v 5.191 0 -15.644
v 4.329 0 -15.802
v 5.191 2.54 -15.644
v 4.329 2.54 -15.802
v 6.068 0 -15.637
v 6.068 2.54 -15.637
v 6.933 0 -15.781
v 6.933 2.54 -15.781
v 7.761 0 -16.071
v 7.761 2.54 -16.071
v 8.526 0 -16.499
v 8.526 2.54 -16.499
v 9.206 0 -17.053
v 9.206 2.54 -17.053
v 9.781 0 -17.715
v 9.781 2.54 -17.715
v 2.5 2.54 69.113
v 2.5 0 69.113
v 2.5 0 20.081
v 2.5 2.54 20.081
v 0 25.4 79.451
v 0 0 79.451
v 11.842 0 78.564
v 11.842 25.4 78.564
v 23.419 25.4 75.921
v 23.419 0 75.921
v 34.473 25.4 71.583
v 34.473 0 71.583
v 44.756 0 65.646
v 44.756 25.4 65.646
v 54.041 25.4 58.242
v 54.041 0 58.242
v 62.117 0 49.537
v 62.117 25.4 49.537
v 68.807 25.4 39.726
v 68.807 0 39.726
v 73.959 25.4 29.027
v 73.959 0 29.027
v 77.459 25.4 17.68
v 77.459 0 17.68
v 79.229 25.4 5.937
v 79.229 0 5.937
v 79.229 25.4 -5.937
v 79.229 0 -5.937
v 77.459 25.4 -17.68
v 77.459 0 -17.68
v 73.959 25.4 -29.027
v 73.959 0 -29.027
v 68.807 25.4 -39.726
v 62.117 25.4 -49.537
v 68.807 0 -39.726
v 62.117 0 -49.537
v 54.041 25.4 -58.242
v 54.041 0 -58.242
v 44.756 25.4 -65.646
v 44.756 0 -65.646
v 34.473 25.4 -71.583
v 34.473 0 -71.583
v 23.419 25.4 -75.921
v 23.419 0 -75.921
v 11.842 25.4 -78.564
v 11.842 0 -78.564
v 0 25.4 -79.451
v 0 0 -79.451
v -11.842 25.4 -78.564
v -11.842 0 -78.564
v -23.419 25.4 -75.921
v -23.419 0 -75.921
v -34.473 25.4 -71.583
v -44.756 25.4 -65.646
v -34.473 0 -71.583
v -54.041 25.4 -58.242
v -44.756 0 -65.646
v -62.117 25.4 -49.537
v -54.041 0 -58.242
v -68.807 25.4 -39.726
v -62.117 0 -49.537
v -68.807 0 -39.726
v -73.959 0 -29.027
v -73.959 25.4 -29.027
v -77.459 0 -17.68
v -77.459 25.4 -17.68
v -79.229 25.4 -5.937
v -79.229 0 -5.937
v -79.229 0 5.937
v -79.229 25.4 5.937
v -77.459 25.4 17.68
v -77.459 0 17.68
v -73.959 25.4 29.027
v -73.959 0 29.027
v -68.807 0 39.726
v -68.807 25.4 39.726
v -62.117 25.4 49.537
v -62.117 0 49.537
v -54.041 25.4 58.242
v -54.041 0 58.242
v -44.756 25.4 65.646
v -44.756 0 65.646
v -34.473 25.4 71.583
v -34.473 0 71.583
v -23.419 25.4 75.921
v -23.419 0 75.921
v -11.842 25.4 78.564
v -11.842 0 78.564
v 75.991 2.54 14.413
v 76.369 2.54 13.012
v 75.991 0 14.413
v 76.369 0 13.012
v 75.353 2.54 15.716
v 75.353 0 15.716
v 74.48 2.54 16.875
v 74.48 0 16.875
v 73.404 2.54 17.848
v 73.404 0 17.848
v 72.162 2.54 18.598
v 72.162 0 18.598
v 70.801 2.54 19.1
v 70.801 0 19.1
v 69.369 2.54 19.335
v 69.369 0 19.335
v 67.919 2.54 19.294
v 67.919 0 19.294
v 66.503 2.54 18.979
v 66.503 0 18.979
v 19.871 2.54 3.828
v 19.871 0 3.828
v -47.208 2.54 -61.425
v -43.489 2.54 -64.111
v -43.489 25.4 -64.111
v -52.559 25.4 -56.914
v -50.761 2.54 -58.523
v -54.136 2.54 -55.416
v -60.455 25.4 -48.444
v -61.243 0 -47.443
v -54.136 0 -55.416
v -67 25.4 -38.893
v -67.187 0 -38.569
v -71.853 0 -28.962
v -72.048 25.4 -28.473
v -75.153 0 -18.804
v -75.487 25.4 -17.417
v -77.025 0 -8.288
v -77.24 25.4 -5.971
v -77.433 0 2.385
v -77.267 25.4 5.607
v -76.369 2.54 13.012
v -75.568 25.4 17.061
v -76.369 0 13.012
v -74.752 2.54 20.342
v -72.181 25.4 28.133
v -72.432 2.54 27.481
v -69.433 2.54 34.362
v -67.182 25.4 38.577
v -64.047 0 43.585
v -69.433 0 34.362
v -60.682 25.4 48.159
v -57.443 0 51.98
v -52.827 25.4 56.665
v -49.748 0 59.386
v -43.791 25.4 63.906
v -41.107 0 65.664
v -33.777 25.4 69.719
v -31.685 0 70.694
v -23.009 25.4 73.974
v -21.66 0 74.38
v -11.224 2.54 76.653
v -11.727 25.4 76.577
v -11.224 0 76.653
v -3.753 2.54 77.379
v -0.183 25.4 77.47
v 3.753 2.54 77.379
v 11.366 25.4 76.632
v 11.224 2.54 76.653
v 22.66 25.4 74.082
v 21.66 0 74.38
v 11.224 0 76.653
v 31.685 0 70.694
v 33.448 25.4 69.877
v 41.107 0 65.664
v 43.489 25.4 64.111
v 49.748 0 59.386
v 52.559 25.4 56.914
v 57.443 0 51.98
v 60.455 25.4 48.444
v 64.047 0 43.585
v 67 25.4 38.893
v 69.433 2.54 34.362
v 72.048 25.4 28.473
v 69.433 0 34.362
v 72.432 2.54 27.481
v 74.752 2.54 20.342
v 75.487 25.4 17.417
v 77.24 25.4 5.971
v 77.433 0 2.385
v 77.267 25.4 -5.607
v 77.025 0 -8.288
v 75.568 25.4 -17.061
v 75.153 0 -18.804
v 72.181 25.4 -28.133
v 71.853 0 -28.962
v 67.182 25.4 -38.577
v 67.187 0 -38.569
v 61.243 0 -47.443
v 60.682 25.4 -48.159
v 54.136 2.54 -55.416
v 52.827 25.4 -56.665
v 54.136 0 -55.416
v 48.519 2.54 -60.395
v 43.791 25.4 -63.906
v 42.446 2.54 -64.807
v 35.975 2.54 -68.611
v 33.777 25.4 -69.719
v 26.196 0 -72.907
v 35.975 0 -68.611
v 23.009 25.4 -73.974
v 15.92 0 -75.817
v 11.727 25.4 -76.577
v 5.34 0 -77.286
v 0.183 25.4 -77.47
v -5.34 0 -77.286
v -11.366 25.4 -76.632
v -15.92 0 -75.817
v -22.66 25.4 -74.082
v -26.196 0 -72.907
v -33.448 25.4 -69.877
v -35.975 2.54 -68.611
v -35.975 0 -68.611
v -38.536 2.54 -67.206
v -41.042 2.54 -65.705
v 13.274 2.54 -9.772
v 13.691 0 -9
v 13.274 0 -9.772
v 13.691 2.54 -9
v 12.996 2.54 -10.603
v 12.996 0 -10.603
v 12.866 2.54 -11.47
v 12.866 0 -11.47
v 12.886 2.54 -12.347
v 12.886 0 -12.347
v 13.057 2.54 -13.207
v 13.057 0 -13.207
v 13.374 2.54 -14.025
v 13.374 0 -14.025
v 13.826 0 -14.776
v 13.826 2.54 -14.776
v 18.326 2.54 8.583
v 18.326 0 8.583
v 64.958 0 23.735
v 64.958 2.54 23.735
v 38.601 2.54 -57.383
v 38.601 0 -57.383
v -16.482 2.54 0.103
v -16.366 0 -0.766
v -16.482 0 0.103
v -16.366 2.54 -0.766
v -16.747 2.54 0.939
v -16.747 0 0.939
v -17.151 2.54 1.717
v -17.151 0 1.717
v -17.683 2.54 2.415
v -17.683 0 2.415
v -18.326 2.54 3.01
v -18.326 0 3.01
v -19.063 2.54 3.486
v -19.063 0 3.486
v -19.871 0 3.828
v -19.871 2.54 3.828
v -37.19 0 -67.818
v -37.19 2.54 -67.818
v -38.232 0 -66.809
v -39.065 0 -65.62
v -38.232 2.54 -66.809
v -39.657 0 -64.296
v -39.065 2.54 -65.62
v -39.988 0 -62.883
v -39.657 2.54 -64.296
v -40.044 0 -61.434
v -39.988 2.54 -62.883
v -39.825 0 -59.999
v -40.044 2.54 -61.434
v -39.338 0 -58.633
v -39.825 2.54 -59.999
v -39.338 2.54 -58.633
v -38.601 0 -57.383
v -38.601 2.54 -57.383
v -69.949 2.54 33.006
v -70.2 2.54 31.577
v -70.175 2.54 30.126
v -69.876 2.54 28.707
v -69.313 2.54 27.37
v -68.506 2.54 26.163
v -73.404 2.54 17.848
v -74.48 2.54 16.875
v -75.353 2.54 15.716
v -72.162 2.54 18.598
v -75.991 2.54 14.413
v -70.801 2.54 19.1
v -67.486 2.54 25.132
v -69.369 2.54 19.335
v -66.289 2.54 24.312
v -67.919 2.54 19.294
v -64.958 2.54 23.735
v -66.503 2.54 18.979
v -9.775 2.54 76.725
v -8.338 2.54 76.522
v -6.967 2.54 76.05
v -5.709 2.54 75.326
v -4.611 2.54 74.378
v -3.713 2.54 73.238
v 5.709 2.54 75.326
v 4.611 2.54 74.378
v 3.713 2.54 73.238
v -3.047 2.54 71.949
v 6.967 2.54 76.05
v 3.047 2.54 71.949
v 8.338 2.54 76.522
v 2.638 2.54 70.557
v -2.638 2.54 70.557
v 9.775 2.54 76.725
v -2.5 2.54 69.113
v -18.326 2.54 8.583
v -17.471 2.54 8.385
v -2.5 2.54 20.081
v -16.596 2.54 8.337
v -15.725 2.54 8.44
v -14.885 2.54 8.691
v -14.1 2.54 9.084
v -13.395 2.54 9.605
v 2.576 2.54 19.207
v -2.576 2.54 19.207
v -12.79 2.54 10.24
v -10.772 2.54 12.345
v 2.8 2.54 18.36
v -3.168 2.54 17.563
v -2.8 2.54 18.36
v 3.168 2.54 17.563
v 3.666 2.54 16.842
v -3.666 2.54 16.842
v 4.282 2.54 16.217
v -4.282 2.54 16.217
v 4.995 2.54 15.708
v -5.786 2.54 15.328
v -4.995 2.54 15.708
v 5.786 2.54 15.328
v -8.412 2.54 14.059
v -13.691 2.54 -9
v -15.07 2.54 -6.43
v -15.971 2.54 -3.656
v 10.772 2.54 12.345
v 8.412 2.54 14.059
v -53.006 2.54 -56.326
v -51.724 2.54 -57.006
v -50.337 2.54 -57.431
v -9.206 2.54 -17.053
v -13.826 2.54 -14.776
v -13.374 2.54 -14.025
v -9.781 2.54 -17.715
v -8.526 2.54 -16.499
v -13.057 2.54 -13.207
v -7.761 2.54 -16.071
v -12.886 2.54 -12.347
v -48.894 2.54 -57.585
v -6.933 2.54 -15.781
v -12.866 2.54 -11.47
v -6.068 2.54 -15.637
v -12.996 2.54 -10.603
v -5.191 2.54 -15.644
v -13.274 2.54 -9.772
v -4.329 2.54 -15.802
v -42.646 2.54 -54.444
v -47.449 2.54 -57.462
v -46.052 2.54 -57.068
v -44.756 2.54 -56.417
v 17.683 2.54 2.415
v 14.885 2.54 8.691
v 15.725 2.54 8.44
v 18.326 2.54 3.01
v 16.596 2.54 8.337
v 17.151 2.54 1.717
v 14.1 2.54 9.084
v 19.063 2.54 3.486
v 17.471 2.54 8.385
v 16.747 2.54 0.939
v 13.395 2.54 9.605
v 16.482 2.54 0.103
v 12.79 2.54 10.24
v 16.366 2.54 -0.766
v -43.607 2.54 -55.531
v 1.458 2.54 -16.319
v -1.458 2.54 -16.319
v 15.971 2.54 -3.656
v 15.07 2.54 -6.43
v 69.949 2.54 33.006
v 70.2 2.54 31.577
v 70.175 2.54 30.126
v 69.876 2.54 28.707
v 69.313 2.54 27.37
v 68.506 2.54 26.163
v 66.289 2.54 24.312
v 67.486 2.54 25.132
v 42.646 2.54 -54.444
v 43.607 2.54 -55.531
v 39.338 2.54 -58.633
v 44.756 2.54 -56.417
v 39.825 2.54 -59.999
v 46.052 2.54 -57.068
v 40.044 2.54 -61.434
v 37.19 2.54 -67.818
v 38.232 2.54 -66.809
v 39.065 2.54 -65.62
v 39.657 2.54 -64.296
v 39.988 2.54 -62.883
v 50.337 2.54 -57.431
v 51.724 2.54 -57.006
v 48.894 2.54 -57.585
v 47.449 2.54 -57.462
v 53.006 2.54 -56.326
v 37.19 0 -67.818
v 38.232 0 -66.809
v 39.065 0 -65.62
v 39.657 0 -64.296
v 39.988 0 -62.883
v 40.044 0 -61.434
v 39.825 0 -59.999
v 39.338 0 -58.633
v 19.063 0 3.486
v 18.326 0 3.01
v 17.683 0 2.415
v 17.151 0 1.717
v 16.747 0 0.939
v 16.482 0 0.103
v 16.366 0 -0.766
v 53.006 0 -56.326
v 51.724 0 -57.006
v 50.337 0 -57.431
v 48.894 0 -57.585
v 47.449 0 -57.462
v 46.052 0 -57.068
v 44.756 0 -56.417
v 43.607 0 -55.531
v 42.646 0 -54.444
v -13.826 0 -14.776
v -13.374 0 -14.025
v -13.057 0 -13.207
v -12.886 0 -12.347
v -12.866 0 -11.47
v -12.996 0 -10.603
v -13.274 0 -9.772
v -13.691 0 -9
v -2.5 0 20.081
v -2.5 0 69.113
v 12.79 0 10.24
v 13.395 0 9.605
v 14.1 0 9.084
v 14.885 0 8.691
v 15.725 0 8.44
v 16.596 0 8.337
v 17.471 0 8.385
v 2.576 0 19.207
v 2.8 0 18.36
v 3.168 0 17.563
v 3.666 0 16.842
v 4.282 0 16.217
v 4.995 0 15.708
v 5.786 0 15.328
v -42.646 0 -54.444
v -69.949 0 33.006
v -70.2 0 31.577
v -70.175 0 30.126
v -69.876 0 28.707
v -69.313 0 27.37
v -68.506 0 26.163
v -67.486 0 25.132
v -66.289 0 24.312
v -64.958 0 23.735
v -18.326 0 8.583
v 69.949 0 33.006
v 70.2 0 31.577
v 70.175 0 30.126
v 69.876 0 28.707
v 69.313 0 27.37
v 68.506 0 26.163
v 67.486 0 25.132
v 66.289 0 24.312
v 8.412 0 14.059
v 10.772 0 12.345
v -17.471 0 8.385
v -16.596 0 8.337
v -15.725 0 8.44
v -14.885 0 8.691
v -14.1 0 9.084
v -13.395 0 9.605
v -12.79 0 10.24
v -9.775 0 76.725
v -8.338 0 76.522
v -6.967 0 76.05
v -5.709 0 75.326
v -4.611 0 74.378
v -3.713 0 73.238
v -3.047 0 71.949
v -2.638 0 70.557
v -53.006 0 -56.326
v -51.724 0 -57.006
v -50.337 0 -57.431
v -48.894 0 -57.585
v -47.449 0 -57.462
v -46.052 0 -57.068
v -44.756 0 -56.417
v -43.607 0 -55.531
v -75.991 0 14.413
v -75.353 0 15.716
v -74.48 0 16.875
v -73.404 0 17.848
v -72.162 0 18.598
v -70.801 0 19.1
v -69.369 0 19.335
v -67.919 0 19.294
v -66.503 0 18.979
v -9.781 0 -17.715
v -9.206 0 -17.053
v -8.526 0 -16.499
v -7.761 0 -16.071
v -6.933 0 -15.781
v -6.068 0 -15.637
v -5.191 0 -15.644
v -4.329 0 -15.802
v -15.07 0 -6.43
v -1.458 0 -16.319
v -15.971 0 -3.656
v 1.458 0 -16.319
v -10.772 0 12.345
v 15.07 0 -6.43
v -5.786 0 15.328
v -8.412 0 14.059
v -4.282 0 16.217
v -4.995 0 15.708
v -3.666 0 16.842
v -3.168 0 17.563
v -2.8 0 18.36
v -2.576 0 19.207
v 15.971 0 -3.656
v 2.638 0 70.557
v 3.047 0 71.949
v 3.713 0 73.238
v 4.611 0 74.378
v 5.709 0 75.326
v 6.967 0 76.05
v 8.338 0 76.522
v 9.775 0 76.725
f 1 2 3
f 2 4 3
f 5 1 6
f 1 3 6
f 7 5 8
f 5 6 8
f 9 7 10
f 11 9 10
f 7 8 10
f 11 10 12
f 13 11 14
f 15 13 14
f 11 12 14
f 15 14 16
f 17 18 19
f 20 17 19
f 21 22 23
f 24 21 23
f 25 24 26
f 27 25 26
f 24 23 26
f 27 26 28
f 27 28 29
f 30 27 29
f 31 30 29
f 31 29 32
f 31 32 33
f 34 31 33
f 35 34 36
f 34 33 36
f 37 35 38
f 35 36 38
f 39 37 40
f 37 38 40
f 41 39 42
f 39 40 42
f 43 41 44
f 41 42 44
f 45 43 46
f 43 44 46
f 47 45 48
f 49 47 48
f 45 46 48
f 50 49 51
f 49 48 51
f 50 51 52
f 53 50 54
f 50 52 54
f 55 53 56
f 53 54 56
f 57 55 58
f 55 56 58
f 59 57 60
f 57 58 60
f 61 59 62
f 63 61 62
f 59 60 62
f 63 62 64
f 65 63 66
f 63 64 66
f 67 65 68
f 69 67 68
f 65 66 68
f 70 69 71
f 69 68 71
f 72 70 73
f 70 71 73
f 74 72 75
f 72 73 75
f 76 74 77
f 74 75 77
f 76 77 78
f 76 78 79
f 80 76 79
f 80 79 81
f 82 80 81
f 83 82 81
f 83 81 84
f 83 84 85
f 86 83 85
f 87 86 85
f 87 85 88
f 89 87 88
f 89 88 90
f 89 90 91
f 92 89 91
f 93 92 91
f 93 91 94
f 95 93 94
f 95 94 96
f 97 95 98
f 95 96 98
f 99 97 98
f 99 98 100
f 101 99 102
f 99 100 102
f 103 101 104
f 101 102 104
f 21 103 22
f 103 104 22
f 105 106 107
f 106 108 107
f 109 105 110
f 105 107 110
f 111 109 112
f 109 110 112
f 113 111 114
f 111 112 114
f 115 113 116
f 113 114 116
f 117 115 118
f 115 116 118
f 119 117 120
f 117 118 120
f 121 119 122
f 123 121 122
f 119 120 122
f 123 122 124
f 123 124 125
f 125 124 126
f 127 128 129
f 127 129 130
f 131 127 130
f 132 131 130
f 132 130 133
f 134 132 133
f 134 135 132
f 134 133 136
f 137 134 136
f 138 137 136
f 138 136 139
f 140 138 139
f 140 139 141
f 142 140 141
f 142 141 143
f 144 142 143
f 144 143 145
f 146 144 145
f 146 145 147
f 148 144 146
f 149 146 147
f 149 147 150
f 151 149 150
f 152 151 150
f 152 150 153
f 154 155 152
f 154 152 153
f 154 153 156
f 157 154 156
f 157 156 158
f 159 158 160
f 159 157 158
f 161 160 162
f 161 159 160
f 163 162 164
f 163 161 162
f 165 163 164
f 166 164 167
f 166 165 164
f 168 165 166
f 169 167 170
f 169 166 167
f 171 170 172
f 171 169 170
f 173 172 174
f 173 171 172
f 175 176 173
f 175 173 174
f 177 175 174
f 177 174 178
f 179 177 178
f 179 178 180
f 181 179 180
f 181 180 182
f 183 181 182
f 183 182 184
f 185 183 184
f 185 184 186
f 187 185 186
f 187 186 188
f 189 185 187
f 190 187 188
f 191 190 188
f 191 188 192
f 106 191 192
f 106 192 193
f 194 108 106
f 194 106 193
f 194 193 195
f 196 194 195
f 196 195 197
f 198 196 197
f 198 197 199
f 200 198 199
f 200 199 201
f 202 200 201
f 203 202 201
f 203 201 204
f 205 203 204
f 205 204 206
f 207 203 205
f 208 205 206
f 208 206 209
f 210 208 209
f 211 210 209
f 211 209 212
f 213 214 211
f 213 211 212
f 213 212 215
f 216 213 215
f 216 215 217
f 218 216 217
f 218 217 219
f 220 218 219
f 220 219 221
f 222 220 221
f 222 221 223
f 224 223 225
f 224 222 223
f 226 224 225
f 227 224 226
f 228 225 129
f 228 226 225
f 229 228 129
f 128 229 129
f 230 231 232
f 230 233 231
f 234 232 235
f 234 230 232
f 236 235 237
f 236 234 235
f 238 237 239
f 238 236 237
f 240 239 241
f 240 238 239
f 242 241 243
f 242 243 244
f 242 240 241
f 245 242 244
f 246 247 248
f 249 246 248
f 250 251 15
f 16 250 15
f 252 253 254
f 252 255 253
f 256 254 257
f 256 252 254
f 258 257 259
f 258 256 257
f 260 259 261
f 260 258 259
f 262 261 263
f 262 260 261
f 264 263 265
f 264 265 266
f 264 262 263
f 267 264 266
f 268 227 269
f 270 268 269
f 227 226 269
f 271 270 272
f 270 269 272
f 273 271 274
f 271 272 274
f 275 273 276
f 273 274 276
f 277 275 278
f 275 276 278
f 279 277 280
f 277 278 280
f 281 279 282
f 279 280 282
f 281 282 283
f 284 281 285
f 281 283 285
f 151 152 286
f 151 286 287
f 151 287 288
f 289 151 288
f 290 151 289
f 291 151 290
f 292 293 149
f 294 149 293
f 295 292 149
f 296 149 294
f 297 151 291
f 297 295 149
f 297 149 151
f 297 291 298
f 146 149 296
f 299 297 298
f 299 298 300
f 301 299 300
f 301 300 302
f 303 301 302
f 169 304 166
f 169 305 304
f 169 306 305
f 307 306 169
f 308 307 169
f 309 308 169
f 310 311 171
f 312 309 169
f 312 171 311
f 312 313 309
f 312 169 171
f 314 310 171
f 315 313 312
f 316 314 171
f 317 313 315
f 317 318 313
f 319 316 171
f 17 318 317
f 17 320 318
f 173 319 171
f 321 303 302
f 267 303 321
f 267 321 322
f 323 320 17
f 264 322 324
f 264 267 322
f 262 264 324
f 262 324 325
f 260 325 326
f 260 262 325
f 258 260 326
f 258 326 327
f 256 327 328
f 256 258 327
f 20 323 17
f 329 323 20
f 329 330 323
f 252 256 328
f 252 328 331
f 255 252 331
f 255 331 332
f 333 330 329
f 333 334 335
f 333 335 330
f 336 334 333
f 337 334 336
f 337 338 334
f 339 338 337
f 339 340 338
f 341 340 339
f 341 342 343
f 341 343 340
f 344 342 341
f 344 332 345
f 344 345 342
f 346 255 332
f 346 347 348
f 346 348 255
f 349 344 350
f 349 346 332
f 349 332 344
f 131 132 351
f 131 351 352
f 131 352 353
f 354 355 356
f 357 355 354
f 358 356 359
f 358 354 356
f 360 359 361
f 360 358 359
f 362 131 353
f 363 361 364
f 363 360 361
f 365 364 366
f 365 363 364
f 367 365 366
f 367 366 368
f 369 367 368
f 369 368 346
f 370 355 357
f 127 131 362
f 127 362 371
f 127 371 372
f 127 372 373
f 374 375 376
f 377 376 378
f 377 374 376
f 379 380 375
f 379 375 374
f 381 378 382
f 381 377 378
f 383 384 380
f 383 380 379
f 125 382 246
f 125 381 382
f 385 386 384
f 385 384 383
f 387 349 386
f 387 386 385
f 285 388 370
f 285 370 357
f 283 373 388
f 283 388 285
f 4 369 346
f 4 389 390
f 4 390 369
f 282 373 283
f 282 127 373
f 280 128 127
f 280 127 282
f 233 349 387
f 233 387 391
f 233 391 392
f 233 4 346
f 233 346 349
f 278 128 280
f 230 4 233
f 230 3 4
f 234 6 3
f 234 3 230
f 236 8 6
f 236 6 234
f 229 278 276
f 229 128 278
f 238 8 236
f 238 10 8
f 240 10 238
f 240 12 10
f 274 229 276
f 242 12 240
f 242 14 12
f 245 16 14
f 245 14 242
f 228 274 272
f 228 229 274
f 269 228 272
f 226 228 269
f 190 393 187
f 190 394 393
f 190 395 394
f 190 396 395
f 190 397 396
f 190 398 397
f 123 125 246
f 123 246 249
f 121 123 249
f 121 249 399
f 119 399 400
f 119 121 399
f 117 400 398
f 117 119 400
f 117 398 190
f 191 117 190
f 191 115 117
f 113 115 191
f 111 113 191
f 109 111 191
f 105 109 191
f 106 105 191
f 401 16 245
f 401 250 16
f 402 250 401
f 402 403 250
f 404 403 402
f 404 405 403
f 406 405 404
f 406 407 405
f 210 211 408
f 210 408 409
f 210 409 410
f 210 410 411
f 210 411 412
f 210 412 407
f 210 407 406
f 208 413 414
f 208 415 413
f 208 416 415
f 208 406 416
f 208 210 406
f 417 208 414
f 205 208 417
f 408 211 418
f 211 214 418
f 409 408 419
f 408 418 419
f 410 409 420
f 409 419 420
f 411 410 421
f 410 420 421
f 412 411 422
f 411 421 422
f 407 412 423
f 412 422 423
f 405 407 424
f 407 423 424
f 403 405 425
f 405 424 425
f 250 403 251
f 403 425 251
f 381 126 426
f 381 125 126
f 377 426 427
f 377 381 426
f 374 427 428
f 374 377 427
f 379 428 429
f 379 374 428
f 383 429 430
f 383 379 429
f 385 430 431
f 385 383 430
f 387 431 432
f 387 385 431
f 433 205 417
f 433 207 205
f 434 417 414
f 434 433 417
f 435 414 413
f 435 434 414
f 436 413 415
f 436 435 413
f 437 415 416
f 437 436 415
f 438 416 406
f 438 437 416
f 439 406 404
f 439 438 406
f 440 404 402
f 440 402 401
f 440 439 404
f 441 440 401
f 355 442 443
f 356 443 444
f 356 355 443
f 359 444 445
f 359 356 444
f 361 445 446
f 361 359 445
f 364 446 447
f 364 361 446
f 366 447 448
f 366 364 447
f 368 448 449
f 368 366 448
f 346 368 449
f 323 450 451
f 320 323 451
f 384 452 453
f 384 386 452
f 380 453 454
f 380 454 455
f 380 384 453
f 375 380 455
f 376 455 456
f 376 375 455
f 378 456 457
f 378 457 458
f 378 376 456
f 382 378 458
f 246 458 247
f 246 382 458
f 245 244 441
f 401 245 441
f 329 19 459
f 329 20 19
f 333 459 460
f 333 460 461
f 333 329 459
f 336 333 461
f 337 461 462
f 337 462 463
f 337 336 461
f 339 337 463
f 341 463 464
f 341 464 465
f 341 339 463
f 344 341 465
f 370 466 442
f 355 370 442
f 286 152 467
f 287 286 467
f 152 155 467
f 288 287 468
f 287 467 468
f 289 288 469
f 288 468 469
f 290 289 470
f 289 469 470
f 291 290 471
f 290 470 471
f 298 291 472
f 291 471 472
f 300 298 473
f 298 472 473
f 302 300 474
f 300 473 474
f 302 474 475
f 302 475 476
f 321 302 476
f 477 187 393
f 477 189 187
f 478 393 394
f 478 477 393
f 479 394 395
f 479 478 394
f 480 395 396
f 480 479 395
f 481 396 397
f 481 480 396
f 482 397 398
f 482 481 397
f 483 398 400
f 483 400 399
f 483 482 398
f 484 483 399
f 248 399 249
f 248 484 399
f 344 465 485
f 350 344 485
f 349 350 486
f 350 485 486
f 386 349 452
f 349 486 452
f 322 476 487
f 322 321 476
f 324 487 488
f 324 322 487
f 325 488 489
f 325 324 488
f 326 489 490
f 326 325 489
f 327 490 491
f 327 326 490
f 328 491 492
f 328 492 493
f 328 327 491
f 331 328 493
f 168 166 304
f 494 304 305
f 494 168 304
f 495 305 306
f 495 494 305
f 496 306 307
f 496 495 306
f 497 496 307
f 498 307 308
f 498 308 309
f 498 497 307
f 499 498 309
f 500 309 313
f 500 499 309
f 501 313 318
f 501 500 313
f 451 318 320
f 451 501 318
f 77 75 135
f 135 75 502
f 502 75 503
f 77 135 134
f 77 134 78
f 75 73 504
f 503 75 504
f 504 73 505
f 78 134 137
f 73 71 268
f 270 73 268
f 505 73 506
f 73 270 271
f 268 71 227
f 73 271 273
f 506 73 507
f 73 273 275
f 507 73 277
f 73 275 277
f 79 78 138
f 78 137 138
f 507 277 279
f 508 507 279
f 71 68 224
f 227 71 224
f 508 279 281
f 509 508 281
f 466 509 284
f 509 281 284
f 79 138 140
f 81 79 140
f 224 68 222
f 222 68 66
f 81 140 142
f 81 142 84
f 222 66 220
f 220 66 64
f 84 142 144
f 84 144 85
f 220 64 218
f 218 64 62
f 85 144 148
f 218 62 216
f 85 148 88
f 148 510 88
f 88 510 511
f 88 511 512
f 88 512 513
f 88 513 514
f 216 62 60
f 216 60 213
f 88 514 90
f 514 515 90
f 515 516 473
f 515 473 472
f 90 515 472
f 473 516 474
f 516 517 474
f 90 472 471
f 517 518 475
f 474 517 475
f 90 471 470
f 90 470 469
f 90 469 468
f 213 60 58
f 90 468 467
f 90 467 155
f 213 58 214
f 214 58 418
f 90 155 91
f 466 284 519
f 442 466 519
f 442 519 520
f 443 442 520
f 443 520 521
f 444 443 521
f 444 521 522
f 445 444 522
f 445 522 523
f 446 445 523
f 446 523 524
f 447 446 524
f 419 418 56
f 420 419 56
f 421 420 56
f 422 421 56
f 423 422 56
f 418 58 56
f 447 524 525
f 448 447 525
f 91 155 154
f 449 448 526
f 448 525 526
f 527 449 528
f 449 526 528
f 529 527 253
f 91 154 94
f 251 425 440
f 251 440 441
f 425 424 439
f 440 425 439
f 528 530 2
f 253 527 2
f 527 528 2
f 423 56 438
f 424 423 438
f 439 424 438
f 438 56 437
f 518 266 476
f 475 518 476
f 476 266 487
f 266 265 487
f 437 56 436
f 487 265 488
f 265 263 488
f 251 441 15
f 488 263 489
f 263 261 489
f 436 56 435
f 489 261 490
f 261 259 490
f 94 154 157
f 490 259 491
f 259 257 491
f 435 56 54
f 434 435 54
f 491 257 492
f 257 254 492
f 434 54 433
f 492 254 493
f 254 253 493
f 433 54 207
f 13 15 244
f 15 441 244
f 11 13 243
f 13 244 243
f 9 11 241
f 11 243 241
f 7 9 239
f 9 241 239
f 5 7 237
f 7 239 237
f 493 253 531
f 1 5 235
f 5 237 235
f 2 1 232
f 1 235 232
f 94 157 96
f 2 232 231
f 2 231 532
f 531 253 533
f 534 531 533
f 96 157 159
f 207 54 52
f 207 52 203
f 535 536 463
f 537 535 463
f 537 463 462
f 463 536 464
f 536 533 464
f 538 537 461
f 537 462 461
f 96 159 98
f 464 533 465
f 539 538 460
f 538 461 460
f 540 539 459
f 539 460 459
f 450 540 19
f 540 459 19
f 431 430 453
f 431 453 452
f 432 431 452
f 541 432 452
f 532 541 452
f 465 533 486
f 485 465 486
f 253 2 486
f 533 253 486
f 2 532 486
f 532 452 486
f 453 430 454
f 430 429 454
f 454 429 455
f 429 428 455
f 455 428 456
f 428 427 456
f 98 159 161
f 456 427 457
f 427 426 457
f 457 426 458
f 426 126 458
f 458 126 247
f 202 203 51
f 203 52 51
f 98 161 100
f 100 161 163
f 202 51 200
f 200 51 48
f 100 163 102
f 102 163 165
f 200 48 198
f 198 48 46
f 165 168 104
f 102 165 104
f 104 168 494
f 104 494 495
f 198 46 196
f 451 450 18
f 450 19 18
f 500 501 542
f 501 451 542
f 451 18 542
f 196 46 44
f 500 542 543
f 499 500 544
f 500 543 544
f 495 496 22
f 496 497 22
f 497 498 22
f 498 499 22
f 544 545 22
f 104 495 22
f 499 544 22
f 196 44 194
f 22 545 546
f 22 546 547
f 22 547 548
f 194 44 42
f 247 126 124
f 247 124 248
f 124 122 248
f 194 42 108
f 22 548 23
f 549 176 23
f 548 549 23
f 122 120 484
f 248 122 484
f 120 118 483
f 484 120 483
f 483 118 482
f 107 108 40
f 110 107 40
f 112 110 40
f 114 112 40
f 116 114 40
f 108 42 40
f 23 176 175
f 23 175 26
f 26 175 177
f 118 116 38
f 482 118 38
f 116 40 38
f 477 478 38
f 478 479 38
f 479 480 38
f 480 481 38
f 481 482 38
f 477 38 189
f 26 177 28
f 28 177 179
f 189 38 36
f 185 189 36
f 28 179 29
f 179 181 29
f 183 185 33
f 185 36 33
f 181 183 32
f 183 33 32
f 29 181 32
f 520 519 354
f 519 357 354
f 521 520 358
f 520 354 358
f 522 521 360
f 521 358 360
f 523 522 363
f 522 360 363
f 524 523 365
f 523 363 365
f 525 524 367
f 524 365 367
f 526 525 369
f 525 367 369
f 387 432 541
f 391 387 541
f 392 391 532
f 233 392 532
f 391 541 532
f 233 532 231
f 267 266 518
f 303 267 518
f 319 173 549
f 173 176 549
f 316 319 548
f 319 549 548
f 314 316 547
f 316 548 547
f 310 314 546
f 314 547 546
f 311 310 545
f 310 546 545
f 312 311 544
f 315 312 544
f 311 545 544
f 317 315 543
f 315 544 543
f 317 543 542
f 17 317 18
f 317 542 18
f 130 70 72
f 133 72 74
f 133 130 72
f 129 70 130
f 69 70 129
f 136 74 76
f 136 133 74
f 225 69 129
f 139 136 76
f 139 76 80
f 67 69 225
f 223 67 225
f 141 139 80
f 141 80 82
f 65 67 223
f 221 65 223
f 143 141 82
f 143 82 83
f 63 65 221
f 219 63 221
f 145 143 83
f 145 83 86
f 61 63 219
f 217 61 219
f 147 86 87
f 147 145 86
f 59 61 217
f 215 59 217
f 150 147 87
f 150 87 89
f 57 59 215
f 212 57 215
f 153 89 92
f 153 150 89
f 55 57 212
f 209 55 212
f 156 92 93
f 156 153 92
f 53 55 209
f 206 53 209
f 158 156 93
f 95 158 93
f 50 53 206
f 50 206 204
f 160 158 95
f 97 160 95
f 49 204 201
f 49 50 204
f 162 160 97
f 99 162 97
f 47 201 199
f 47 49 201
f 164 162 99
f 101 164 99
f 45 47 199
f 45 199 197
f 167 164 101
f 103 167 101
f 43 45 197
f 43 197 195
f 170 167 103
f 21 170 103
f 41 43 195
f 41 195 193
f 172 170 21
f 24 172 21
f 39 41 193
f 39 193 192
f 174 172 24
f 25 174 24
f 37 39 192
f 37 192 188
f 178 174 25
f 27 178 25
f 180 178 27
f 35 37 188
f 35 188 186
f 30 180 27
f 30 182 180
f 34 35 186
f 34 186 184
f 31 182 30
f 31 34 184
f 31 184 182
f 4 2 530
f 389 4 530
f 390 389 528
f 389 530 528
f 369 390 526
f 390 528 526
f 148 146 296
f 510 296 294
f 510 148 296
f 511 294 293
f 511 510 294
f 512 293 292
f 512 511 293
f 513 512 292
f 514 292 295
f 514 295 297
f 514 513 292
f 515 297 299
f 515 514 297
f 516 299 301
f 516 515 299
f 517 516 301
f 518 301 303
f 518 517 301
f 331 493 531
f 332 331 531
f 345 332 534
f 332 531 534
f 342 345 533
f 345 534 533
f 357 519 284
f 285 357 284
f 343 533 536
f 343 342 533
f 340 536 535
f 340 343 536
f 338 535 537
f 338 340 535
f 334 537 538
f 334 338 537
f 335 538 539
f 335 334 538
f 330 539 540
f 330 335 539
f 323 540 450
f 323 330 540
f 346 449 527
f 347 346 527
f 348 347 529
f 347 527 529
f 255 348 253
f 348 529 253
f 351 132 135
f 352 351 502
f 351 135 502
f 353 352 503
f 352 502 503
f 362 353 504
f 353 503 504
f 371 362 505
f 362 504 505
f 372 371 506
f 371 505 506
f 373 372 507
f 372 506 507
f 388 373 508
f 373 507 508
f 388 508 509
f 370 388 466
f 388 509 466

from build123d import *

# Parameters (mm, degrees)
SKETCH1_R           = 16.383937572
BOSS_EXTRUDE1_DEPTH = 2.54
SKETCH2_R           = 79.4512
SKETCH2_R_2         = 77.47
BOSS_EXTRUDE2_DEPTH = 25.4
FILLET2_R           = 7.62
FILLET3_R           = 5.08


with BuildPart() as part:
    # Sketch1 → Boss-Extrude1 (new body)
    with BuildSketch(Plane(origin=(0, 0, 0), x_dir=(1, 0, 0), z_dir=(0, 1, 0))):
        Circle(SKETCH1_R)
        with BuildLine():
            ThreePointArc((-11.540007509, 11.630203655), (-9.630236879, 13.254883931), (-7.494922537, 14.569129917))
            Line((-7.494922537, 14.569129917), (-43.513181009, 64.144009685))
            Line((-43.513181009, 64.144009685), (-47.558265981, 61.205083423))
            Line((-47.558265981, 61.205083423), (-11.540007509, 11.630203655))
        make_face()
        with BuildLine():
            Line((43.513181009, 64.144009685), (7.494922537, 14.569129917))
            ThreePointArc((7.494922537, 14.569129917), (9.630236879, 13.254883931), (11.540007509, 11.630203655))
            Line((11.540007509, 11.630203655), (47.558265981, 61.205083423))
            Line((47.558265981, 61.205083423), (43.513181009, 64.144009685))
        make_face()
        with BuildLine():
            Line((74.450890803, -21.561905263), (16.17212438, -2.62598618))
            ThreePointArc((16.17212438, -2.62598618), (15.582050591, -5.062915145), (14.627039408, -7.381268762))
            Line((14.627039408, -7.381268762), (72.905805831, -26.317187845))
            Line((72.905805831, -26.317187845), (74.450890803, -21.561905263))
        make_face()
        with BuildLine():
            Line((2.5, -77.47), (2.5, -16.19207863))
            ThreePointArc((2.5, -16.19207863), (0, -16.383937572), (-2.5, -16.19207863))
            Line((-2.5, -16.19207863), (-2.5, -77.47))
            Line((-2.5, -77.47), (2.5, -77.47))
        make_face()
        with BuildLine():
            ThreePointArc((-14.627039408, -7.381268762), (-15.582050591, -5.062915145), (-16.17212438, -2.62598618))
            Line((-16.17212438, -2.62598618), (-74.450890803, -21.561905263))
            Line((-74.450890803, -21.561905263), (-72.905805831, -26.317187845))
            Line((-72.905805831, -26.317187845), (-14.627039408, -7.381268762))
        make_face()
    extrude(amount=BOSS_EXTRUDE1_DEPTH)

    # Sketch2 → Boss-Extrude2 (add)
    with BuildSketch(Plane(origin=(0, 0, 0), x_dir=(1, 0, 0), z_dir=(0, 1, 0))):
        with Locations(Location((0, 0, 0), (0, 0, 270))):
            Circle(SKETCH2_R)
        with Locations(Location((0, 0, 0), (0, 0, 124.150712253))):
            Circle(SKETCH2_R_2, mode=Mode.SUBTRACT)
    extrude(amount=BOSS_EXTRUDE2_DEPTH)

    # Fillet2
    fillet2_edges = [part.edges().sort_by_distance(p)[0] for p in [
        (72.867431935, 1.27, 26.30471941),
        (47.534549609, 1.27, -61.172440637),
        (-43.489464637, 1.27, -64.111366899),
        (-74.412516907, 1.27, 21.549436829),
        (-2.5, 1.27, 77.429651297),
        (-47.534549609, 1.27, -61.172440637),
        (43.489464637, 1.27, -64.111366899),
        (74.412516907, 1.27, 21.549436829),
        (2.5, 1.27, 77.429651297),
        (-72.867431935, 1.27, 26.30471941),
    ]]
    fillet(fillet2_edges, radius=FILLET2_R)

    # Fillet3
    fillet3_edges = [part.edges().sort_by_distance(p)[0] for p in [
        (-2.5, 1.27, 16.19207863),
        (-14.627039408, 1.27, 7.381268762),
        (-16.17212438, 1.27, 2.62598618),
        (-11.540007509, 1.27, -11.630203655),
        (-7.494922537, 1.27, -14.569129917),
        (7.494922537, 1.27, -14.569129917),
        (11.540007509, 1.27, -11.630203655),
        (16.17212438, 1.27, 2.62598618),
        (14.627039408, 1.27, 7.381268762),
        (2.5, 1.27, 16.19207863),
    ]]
    fillet(fillet3_edges, radius=FILLET3_R)


solid = part.part
